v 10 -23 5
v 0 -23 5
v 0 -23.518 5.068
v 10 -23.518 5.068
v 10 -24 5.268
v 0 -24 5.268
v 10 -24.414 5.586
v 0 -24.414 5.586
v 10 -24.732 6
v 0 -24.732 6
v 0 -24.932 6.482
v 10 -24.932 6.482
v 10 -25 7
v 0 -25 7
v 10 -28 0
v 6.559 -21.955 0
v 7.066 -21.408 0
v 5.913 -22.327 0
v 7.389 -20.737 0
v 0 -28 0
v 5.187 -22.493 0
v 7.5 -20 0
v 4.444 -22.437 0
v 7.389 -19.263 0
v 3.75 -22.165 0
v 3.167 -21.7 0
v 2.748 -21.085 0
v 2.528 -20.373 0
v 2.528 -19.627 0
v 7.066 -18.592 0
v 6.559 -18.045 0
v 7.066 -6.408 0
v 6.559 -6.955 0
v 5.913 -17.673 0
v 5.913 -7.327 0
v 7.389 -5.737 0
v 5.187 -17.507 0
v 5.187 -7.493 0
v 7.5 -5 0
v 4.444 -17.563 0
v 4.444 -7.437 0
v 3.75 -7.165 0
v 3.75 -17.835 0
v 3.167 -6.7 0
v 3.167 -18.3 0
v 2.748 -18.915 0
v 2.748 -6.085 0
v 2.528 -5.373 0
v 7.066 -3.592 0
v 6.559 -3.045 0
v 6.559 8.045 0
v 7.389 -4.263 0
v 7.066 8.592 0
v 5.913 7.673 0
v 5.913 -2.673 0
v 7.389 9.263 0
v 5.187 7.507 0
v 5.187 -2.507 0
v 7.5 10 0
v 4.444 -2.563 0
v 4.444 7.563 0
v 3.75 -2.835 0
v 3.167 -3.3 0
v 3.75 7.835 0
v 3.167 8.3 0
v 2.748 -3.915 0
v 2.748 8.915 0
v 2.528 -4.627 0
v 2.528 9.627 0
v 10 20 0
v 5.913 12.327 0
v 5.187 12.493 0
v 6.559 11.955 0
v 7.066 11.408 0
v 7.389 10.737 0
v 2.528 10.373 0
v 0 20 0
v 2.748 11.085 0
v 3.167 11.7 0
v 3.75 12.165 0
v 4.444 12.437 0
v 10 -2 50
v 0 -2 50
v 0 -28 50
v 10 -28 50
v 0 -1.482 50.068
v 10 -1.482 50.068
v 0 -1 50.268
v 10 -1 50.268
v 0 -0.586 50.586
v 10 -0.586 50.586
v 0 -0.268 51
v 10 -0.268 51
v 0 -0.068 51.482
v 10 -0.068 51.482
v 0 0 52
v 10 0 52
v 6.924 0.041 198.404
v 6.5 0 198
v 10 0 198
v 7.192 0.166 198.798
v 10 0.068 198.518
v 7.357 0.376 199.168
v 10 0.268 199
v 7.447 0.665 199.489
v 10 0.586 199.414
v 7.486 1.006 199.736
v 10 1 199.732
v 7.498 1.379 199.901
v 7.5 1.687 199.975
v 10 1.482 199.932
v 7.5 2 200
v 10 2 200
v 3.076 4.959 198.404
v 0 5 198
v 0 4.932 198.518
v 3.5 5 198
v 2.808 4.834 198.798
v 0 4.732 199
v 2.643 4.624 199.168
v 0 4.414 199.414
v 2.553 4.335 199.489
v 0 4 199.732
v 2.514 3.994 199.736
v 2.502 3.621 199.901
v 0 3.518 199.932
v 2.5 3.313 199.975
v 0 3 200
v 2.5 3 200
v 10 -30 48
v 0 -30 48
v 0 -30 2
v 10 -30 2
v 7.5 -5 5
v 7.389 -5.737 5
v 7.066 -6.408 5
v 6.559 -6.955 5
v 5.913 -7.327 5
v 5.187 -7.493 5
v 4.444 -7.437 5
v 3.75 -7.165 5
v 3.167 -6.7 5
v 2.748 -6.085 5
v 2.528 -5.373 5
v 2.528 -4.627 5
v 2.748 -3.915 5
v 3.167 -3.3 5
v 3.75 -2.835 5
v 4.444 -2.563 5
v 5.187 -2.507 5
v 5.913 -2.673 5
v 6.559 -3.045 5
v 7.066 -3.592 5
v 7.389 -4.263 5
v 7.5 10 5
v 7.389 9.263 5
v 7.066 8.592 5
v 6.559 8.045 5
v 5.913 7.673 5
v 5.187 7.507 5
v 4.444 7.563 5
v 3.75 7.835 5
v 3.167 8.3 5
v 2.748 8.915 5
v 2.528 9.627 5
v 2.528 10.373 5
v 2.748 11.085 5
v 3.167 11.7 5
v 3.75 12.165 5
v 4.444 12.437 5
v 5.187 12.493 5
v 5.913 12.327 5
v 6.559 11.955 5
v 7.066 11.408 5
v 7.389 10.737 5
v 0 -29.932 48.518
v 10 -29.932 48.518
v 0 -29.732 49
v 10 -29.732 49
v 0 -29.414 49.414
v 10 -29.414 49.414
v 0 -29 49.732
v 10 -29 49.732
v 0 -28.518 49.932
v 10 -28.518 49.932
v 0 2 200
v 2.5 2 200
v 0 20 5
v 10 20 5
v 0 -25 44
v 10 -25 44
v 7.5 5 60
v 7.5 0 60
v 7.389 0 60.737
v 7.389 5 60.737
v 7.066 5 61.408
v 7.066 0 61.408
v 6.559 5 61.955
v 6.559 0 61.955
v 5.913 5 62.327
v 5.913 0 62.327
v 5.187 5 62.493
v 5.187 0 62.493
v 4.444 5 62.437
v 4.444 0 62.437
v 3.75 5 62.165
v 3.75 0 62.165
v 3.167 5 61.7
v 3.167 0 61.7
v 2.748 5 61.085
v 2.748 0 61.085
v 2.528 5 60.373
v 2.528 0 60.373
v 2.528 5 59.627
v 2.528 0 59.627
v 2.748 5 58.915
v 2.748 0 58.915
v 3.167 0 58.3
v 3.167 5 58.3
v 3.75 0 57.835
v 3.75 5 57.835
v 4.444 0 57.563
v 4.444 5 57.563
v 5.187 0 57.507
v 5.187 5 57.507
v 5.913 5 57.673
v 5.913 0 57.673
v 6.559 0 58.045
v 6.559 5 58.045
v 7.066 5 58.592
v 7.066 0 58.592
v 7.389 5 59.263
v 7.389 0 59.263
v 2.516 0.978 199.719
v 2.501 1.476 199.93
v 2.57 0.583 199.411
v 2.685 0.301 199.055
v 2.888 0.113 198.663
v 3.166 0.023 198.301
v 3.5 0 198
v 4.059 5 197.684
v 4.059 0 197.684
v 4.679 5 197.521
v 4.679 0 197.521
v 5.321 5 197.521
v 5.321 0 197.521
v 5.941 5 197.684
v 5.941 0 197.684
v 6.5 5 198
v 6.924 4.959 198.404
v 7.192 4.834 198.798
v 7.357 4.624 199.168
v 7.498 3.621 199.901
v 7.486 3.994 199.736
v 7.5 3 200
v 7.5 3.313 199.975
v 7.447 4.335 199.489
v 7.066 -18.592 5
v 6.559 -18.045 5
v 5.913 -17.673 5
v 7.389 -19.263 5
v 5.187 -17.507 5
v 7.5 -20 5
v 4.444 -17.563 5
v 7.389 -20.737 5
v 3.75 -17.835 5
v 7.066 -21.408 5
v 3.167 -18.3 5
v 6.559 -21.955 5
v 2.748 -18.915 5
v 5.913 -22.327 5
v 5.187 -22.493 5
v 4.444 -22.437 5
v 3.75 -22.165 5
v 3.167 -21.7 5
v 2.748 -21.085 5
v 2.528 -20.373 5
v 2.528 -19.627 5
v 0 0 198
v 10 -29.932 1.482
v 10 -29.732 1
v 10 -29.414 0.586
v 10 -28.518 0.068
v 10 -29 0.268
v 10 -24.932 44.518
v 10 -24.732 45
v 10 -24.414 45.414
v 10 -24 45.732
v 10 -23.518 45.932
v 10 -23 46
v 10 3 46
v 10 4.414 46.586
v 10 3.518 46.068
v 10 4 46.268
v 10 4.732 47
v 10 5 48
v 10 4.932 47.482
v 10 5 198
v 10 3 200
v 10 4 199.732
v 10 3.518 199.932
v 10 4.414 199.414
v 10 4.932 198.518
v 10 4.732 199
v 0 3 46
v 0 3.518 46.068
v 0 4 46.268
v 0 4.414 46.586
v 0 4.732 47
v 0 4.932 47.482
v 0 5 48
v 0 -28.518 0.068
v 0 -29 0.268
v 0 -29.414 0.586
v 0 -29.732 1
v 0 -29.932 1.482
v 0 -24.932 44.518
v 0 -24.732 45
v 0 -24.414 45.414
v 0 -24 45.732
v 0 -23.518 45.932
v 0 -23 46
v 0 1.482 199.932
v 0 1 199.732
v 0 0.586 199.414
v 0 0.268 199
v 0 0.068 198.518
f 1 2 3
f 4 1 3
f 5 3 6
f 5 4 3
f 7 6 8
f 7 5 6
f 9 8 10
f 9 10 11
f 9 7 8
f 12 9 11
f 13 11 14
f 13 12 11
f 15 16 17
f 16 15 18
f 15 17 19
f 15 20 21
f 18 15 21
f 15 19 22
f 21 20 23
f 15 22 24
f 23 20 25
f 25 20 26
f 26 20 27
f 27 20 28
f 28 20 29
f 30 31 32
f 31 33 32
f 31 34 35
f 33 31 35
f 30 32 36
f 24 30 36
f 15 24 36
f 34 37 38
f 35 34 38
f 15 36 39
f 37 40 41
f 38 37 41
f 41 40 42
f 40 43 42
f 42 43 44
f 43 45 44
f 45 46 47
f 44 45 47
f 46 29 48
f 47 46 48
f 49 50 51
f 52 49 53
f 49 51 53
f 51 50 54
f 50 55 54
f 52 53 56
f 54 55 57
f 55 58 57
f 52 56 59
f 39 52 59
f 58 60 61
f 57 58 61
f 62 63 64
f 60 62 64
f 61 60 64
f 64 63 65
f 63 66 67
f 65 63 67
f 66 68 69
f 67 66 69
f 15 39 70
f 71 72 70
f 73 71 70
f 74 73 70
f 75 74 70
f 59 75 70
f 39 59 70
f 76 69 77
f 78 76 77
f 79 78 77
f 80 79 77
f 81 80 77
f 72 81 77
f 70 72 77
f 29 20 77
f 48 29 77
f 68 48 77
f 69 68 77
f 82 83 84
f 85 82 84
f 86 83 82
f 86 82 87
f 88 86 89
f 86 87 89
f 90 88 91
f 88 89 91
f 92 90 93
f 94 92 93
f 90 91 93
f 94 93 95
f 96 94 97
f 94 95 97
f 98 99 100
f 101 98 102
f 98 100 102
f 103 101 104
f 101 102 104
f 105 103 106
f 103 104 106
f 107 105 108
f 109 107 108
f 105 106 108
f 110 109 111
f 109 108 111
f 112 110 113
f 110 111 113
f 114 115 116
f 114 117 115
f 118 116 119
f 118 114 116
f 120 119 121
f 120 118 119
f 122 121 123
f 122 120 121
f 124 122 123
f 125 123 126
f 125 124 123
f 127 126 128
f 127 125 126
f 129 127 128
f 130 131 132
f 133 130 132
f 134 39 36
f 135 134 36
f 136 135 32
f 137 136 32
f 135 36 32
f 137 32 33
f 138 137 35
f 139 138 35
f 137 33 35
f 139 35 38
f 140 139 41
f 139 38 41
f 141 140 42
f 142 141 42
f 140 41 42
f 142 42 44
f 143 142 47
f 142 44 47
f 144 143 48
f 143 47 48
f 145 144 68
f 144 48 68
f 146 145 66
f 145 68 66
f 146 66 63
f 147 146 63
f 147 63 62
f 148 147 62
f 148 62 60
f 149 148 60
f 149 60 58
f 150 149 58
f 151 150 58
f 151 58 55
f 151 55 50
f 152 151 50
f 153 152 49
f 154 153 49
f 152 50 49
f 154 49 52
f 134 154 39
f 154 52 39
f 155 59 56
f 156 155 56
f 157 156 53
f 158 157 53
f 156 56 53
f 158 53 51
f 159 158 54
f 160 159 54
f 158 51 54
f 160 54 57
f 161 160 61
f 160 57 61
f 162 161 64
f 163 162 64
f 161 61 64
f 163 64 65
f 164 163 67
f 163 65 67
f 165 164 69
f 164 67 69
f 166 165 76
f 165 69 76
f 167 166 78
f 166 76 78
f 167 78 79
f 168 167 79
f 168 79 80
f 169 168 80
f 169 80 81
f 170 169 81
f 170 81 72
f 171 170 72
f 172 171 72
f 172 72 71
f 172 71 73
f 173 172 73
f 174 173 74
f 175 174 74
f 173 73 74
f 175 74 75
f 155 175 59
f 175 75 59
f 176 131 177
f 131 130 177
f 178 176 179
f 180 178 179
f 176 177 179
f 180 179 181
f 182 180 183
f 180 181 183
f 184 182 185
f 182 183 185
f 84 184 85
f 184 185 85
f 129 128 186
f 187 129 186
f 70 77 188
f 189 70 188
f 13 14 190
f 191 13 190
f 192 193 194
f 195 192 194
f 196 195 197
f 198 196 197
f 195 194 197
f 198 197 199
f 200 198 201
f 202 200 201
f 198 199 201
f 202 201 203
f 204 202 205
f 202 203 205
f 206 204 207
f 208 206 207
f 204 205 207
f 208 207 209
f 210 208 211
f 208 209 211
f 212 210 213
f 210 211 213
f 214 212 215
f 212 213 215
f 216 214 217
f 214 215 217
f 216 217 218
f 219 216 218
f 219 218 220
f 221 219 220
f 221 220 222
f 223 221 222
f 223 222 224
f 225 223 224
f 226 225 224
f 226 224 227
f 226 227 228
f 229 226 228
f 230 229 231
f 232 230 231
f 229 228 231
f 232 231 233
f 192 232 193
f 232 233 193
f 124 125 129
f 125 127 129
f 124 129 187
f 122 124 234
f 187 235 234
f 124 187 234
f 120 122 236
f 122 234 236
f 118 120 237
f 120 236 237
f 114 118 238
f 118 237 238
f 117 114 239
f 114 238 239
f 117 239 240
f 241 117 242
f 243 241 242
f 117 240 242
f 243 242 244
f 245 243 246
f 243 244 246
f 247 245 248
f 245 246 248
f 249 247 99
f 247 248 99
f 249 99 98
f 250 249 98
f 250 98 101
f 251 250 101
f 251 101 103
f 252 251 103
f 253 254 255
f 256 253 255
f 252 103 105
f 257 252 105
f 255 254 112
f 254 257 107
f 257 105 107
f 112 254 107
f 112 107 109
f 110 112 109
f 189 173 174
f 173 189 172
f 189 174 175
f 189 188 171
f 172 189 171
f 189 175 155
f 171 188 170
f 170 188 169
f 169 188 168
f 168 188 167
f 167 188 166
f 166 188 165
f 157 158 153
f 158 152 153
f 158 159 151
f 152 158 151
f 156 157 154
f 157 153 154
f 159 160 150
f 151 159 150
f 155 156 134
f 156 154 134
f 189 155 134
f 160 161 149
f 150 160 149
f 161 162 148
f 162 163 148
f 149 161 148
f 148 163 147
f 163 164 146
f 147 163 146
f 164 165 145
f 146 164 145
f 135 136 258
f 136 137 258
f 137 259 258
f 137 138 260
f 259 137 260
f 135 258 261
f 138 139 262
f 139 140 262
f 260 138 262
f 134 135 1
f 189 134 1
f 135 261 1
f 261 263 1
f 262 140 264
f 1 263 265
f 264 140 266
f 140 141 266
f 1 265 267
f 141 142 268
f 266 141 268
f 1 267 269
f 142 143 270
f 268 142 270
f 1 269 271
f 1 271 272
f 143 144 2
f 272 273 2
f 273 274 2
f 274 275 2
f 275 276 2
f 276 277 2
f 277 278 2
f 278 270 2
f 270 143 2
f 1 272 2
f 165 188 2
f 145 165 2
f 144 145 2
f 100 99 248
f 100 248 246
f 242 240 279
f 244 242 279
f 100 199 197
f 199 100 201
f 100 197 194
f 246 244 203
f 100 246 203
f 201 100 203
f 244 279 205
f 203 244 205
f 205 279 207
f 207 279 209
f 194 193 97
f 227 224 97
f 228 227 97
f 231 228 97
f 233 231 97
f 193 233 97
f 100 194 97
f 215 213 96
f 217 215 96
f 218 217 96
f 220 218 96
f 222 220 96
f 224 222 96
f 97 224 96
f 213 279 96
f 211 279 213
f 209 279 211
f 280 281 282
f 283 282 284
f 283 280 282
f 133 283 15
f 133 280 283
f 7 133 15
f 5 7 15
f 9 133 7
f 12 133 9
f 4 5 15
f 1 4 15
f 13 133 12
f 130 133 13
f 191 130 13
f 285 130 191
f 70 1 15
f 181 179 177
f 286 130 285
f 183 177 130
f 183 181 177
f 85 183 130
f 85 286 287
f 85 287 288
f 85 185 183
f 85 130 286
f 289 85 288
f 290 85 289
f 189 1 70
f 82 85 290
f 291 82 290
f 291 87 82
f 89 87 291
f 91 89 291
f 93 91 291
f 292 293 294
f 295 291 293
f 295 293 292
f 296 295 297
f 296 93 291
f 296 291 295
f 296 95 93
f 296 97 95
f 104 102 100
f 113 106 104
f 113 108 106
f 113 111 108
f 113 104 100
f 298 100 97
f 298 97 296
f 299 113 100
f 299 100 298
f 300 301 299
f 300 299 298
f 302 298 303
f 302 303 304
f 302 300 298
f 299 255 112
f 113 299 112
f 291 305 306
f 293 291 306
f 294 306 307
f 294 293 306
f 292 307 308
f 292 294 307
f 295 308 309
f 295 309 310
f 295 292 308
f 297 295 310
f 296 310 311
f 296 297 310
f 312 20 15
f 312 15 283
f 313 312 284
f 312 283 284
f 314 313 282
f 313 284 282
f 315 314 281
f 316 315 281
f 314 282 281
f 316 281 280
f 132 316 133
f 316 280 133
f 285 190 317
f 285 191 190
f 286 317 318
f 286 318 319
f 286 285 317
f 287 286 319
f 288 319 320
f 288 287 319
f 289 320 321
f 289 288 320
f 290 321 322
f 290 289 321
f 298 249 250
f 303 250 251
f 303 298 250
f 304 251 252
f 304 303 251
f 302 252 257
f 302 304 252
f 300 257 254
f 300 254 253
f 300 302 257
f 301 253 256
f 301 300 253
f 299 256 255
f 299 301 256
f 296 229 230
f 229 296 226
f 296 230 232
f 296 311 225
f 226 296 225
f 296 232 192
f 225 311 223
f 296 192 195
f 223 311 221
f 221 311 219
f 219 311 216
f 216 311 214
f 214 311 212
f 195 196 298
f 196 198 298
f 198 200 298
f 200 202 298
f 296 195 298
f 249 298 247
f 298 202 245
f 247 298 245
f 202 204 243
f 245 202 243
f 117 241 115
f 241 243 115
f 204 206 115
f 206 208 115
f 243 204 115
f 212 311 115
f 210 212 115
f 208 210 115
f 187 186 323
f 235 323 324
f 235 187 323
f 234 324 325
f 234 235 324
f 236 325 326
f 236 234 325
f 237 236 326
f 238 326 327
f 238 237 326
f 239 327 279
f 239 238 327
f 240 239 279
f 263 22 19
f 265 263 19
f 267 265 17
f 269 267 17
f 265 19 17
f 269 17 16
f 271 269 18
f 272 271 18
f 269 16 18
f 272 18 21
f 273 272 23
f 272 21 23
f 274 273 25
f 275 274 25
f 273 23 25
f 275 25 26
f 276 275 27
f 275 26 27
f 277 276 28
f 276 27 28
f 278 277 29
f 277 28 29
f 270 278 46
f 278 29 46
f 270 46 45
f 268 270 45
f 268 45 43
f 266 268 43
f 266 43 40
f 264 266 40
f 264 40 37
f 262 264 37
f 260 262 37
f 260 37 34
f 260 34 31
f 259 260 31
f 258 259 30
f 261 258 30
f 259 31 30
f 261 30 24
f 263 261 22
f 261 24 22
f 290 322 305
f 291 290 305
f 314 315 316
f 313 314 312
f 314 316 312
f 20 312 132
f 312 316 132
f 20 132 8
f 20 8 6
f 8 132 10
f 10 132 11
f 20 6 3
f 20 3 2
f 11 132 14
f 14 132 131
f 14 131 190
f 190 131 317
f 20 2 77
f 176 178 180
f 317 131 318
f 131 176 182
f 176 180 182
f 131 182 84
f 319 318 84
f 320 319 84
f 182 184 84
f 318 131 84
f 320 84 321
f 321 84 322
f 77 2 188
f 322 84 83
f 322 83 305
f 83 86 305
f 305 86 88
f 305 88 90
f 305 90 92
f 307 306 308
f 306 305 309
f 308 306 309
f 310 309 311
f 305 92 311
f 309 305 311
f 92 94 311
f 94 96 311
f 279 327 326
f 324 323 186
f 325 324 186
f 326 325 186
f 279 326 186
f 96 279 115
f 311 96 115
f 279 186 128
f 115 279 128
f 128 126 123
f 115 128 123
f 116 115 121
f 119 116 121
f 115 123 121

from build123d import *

# Parameters (mm, degrees)
F1_DEPTH = 10
F2_R     = 2.5
F3_DEPTH = 5
F4_R     = 2.5
F5_DEPTH = 5
F6_R     = 2


with BuildPart() as f1:
    # F0 (on Right) → F1 (new body)
    with BuildSketch(Plane.YZ):
        Polygon((-30, 0), (20, 0), (20, 5), (-25, 5), (-25, 46), (5, 46), (5, 200), (0, 200), (0, 50), (-30, 50), align=None)
    extrude(amount=F1_DEPTH)

    # F2 (on face) → F3 (cut, through all)
    with BuildSketch(Plane.XZ):
        with BuildLine():
            ThreePointArc((2.5, 200), (5, 197.5), (7.5, 200))
            Line((7.5, 200), (2.5, 200))
        make_face()
        with Locations((5, 60)):
            Circle(F2_R)
    extrude(amount=-F3_DEPTH, mode=Mode.SUBTRACT)

    # F4 (on face) → F5 (cut, through all)
    with BuildSketch(Plane(origin=(0, 0, 0), x_dir=(1, 0, 0), z_dir=(0, 0, -1))):
        with Locations((5, 20)):
            Circle(F4_R)
        with Locations((5, 5)):
            Circle(F4_R)
        with Locations((5, -10)):
            Circle(F4_R)
    extrude(amount=-F5_DEPTH, mode=Mode.SUBTRACT)

    # F6
    f6_edges = [f1.edges().sort_by_distance(p)[0] for p in [
        (5, -30, 50),
        (5, -25, 46),
        (5, -30, 0),
        (5, -25, 5),
        (5, 5, 46),
        (5, 0, 50),
        (1.25, 5, 200),
        (8.75, 5, 200),
        (1.25, 0, 200),
        (8.75, 0, 200),
    ]]
    fillet(f6_edges, radius=F6_R)


solid = f1.part
